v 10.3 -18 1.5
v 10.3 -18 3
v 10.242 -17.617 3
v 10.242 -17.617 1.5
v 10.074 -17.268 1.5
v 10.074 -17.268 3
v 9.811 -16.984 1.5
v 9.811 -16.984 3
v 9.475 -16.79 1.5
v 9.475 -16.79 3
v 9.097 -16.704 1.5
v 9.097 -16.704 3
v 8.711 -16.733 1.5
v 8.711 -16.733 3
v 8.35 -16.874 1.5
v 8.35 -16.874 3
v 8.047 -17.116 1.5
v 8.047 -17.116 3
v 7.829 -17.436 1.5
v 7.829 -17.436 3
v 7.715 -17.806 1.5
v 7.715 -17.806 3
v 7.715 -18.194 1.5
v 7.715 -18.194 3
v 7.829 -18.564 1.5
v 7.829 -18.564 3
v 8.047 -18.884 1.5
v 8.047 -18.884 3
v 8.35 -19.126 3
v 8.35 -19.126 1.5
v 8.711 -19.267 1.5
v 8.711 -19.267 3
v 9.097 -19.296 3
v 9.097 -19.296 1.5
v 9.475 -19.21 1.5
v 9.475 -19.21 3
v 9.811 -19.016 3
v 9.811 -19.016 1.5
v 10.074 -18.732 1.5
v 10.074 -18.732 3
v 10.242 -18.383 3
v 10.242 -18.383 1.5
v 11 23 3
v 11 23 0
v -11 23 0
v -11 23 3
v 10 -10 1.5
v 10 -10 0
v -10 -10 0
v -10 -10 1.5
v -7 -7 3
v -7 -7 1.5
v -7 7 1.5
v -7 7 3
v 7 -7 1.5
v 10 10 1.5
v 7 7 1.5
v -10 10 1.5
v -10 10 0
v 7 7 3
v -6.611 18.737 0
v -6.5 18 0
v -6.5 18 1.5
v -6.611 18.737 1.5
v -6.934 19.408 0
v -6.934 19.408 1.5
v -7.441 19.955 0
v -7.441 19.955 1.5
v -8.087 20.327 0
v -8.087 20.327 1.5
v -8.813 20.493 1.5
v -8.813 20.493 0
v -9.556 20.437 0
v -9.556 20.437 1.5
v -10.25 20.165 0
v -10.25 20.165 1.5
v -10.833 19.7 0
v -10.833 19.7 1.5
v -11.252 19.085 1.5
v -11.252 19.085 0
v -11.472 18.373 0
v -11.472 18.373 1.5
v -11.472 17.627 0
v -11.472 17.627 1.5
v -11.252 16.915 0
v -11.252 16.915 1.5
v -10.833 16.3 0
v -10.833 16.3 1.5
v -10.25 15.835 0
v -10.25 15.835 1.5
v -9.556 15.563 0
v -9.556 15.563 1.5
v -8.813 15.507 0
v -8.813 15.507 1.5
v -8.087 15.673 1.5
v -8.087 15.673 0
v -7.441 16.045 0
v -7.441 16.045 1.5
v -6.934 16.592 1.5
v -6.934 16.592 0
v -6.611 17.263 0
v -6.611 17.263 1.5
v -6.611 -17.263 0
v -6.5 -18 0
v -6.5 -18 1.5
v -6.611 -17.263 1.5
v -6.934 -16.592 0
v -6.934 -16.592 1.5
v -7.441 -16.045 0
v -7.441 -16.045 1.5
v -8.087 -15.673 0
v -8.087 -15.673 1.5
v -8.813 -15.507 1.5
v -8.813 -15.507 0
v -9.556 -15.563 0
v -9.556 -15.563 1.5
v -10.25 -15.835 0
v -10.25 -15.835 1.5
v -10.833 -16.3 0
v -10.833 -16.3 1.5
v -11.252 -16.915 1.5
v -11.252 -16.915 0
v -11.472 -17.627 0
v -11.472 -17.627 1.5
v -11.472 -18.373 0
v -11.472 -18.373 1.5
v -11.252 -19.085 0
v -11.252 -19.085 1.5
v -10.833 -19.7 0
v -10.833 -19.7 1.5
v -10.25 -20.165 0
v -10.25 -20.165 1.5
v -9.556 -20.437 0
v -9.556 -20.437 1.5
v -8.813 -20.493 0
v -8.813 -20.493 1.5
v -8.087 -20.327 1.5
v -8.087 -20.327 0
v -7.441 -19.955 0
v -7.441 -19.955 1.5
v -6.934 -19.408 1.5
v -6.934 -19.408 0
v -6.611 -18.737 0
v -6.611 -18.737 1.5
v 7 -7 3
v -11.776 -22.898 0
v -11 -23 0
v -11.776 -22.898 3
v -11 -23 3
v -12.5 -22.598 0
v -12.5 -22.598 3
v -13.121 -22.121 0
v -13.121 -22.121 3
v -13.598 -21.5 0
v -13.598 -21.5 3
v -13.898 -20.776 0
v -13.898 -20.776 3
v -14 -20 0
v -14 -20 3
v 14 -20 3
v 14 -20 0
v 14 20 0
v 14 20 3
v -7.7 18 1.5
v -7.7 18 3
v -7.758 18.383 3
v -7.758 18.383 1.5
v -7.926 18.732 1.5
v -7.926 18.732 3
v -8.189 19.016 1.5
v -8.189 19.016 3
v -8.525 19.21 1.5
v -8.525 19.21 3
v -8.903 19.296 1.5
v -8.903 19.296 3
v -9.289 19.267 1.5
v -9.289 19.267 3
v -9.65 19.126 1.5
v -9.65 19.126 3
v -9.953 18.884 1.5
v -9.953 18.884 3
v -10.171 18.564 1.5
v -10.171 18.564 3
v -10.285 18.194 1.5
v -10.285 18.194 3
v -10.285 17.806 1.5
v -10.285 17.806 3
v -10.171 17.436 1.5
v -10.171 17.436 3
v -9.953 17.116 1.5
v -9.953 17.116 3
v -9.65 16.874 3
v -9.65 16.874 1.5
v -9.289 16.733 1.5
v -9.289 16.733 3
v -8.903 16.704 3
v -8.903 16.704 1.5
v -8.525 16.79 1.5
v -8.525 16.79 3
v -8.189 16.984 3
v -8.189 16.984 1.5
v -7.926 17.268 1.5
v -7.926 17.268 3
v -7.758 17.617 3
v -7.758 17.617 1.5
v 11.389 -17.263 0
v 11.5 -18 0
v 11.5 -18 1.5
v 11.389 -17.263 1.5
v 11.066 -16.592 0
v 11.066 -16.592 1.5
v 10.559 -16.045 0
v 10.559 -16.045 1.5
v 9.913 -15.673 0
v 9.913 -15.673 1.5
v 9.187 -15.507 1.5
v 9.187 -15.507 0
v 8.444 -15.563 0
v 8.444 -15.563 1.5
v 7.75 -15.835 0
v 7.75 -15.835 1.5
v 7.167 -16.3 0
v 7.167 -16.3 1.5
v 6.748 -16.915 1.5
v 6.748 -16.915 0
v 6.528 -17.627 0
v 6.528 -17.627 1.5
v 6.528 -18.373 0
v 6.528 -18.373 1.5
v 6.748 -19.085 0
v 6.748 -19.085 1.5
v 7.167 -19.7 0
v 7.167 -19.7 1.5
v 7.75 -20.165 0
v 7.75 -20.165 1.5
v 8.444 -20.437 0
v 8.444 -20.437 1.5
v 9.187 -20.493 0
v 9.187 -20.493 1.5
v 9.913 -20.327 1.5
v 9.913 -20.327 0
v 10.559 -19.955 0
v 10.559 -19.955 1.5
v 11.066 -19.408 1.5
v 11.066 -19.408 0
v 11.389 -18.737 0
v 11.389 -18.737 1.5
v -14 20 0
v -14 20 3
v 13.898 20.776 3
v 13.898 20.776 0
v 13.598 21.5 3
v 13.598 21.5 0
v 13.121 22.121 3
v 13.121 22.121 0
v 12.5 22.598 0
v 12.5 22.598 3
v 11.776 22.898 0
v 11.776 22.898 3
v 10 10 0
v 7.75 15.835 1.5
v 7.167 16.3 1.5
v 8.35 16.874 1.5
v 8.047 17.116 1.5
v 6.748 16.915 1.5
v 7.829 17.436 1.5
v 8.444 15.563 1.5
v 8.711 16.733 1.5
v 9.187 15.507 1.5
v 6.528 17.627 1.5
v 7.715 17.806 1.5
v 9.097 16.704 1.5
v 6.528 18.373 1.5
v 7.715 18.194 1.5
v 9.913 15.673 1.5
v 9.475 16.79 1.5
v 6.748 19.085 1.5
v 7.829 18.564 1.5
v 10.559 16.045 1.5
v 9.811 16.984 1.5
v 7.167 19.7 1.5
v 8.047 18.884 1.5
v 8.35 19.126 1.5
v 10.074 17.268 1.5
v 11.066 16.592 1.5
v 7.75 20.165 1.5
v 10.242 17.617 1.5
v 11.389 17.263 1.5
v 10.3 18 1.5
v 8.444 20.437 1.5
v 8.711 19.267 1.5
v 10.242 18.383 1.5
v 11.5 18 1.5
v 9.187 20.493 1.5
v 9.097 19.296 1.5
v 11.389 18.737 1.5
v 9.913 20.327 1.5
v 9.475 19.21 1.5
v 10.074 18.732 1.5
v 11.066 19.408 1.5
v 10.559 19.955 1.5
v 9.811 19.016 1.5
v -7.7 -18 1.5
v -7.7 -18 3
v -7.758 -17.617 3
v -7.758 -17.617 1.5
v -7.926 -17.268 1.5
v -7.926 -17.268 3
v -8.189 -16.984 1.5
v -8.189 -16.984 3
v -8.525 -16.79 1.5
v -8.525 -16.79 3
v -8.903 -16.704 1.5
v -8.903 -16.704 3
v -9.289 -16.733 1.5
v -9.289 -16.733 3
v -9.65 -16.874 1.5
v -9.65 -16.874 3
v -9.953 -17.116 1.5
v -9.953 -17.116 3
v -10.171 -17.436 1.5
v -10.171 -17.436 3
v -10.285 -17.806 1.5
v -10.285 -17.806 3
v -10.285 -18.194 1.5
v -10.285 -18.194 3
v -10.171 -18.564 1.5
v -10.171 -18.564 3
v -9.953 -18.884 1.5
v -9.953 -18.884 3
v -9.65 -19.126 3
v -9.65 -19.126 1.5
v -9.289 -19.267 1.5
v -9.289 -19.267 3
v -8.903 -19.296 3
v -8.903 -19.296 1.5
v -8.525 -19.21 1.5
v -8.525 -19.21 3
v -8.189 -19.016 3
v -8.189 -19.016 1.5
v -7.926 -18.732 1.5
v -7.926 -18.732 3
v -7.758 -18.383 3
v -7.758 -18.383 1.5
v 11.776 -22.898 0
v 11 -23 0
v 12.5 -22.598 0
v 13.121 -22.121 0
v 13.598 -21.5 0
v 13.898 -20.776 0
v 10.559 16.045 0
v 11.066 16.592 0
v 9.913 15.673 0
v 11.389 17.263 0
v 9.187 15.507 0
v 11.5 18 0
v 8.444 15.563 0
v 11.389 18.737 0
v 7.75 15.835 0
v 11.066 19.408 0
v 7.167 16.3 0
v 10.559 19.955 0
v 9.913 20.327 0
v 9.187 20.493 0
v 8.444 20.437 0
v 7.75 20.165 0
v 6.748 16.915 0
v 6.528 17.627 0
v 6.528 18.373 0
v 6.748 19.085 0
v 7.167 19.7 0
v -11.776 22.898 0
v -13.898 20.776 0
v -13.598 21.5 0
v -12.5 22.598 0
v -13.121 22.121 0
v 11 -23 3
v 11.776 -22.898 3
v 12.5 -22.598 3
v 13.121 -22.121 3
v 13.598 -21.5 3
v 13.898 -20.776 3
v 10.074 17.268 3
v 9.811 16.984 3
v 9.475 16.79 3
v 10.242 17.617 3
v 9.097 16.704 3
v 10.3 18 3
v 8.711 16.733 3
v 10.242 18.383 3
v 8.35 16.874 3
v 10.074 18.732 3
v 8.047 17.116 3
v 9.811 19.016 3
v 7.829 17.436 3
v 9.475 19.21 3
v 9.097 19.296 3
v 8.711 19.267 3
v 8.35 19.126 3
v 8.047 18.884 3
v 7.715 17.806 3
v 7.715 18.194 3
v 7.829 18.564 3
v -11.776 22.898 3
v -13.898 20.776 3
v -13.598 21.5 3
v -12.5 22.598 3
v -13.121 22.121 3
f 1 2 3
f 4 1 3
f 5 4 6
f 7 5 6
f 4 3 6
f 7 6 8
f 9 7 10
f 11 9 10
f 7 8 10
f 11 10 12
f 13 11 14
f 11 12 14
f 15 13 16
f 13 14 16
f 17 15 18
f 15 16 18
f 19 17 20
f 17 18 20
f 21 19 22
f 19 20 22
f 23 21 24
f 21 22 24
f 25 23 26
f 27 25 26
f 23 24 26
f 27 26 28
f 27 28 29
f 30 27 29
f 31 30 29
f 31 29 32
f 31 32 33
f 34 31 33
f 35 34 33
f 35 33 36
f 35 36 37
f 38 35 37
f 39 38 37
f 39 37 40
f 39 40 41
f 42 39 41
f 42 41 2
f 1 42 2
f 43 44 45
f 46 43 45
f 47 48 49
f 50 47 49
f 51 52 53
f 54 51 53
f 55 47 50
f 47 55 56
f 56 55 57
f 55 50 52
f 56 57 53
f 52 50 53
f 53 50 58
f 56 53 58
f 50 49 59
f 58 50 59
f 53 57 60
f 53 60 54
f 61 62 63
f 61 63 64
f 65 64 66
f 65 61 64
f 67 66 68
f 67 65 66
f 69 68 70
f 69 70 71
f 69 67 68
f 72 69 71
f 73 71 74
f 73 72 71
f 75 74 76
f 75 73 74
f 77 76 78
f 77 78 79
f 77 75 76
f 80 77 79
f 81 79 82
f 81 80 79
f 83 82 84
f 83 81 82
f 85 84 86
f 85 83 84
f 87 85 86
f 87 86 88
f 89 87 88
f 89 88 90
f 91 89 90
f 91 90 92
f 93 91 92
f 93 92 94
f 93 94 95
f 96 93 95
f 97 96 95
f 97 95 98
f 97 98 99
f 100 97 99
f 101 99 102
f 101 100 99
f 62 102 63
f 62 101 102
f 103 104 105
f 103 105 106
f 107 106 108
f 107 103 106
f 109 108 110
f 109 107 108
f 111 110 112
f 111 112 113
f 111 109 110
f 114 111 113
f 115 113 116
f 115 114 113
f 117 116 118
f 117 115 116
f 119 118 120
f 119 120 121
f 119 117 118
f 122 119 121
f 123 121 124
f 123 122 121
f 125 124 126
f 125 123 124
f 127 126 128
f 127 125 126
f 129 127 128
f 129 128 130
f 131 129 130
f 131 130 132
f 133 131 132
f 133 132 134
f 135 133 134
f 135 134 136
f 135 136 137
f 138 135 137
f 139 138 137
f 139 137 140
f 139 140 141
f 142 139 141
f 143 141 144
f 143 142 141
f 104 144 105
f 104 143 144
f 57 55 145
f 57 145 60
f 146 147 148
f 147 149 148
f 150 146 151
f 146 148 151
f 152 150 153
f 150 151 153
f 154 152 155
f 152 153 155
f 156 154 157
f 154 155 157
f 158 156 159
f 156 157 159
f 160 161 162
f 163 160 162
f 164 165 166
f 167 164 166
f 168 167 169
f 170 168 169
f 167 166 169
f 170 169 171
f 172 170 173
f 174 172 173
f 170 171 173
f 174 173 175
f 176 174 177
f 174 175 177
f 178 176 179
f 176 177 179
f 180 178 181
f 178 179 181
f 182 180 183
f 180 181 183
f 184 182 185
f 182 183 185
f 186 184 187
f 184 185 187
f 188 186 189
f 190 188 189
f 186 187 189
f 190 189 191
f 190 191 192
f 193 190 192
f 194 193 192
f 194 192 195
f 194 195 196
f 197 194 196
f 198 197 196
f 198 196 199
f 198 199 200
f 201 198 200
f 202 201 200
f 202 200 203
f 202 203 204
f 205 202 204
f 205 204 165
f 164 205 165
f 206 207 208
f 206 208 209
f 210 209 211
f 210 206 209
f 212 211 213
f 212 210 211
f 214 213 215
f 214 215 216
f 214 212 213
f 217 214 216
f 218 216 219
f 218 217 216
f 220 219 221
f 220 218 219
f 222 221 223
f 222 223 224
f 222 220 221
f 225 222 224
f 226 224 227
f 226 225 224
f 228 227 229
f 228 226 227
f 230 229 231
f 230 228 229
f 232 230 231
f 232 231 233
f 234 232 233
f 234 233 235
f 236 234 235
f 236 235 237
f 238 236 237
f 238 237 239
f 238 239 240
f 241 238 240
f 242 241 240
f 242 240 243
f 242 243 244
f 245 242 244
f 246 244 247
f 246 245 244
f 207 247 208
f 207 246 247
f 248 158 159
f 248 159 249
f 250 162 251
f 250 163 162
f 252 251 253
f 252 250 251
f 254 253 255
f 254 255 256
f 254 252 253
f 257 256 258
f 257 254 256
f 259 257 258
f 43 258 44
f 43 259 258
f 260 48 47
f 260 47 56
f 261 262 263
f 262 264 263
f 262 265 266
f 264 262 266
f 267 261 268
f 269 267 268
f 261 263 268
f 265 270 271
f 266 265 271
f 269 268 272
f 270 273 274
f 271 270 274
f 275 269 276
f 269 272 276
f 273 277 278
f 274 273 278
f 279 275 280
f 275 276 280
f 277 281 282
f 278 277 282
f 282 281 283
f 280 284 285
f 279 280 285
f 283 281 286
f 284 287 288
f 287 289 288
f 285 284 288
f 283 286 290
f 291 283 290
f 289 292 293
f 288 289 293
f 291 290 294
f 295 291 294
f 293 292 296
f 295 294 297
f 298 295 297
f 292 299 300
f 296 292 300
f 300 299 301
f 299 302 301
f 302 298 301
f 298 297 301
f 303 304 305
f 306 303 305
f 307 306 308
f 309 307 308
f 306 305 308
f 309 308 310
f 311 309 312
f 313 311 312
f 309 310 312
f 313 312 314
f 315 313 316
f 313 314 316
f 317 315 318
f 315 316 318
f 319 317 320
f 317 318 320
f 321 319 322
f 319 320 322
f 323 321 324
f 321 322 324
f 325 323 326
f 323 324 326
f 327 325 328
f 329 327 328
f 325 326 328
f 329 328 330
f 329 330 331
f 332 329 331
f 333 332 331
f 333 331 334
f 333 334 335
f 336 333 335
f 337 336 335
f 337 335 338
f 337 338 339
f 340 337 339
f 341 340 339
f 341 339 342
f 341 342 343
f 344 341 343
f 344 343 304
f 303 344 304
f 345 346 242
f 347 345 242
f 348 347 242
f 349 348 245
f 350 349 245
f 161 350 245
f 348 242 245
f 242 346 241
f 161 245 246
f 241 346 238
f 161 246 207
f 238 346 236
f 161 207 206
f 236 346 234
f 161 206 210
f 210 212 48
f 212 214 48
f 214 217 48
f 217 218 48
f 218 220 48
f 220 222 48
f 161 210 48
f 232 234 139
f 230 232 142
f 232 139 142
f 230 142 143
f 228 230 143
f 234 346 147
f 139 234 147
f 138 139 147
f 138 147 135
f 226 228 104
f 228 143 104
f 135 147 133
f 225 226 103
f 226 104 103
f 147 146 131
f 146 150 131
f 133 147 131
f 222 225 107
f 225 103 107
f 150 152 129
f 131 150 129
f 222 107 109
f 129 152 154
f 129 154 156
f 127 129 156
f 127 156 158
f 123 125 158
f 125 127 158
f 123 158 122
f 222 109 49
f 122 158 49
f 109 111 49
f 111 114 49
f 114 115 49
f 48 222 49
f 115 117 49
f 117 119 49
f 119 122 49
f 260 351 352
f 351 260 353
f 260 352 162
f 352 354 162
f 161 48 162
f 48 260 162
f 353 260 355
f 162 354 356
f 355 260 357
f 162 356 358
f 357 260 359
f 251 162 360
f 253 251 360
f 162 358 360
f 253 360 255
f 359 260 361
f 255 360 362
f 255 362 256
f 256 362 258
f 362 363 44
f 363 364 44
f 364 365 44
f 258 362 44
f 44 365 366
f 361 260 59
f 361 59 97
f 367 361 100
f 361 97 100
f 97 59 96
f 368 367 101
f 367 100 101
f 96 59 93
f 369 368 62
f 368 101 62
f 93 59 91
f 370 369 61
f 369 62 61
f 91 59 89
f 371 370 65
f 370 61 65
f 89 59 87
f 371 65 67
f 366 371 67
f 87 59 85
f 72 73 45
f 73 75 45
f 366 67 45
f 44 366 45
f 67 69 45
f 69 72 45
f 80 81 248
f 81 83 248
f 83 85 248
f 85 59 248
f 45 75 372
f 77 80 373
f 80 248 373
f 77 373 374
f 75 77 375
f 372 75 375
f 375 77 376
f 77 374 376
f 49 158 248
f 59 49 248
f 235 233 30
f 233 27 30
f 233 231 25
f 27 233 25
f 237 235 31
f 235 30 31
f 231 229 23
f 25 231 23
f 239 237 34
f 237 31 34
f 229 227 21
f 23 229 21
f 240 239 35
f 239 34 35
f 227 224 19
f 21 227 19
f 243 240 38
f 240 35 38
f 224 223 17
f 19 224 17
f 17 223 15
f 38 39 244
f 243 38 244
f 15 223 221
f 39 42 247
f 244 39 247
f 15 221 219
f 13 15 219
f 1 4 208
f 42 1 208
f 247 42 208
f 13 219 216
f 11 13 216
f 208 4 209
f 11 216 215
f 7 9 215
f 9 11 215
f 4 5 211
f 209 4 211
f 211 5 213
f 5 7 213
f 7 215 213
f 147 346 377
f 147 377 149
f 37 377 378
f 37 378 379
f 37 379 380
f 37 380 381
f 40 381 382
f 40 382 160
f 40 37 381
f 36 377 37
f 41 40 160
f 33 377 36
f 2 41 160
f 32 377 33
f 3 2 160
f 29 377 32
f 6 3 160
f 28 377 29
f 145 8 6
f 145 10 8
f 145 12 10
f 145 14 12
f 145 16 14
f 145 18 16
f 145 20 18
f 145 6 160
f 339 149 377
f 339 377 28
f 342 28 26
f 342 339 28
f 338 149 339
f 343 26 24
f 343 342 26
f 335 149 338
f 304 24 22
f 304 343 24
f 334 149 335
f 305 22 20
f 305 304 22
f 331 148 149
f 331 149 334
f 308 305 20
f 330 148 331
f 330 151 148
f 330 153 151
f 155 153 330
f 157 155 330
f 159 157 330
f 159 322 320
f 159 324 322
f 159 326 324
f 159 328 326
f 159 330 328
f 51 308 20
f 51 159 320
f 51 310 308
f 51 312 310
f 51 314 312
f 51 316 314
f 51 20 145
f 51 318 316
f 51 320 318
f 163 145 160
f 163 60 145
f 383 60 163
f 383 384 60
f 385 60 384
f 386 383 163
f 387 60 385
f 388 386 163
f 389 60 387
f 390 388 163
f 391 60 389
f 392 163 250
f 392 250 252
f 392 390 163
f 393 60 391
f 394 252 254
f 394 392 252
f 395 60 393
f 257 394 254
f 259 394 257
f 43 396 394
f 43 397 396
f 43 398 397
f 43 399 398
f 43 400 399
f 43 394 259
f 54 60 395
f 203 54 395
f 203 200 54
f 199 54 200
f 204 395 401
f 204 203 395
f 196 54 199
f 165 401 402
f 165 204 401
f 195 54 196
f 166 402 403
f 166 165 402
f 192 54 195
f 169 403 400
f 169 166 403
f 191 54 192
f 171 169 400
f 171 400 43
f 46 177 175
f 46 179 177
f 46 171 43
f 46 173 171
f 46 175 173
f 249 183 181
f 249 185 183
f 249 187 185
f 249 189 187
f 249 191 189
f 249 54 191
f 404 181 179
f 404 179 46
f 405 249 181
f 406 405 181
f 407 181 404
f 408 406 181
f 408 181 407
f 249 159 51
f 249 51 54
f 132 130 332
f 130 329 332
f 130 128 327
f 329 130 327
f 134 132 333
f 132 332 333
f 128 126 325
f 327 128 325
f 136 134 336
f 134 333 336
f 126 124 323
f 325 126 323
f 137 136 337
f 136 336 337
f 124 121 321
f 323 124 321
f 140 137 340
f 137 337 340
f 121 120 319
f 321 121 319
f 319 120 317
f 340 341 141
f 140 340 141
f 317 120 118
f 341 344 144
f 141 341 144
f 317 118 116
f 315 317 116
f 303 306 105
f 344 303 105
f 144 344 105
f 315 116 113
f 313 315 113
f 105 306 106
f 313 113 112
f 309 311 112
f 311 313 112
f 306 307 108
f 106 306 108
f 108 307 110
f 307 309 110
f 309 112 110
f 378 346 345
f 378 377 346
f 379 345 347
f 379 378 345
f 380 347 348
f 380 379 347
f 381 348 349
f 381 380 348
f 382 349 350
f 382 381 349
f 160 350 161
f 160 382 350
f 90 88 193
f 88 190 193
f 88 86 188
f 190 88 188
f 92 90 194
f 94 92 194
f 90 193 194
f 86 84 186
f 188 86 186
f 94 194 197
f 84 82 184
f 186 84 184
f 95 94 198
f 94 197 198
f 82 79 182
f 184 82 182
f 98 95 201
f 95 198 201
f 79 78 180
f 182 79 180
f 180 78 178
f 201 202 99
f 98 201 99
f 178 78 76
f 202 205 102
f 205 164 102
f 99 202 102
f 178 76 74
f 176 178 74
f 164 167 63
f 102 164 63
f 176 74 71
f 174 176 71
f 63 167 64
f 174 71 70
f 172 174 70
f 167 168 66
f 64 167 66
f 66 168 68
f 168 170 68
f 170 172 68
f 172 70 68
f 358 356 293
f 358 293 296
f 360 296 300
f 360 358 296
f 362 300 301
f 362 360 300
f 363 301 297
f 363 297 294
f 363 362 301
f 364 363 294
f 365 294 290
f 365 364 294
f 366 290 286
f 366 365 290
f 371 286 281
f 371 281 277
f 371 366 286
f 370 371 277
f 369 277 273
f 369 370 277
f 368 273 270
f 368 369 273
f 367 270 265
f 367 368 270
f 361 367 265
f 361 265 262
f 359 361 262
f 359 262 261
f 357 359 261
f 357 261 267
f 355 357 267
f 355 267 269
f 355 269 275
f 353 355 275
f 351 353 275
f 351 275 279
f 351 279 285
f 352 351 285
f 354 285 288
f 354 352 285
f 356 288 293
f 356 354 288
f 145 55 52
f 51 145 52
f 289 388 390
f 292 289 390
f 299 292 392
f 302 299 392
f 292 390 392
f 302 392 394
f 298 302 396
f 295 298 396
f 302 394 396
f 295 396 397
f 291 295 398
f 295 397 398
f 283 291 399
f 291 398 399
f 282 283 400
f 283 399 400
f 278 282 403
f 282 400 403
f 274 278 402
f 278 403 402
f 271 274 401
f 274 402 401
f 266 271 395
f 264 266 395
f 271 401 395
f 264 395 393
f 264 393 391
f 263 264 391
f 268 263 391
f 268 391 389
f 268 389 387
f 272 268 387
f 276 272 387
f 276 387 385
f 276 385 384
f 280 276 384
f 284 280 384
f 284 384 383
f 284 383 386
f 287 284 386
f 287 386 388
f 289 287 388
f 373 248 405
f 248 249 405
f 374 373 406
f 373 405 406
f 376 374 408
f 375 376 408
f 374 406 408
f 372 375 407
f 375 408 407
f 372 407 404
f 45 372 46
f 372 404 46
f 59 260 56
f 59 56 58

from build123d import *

# Parameters (mm, degrees)
SKETCH2_W                  = 46
SKETCH2_H                  = 28
SKETCH2_W_2                = 14
SKETCH2_H_2                = 14
BOSS_EXTRUDE1_DEPTH        = 3
F_2_6_2_6_DIAMETER_HOLE1_D = 2.6
SKETCH2_6_W                = 20
SKETCH2_6_H                = 20
SKETCH2_6_R                = 2.5
CUT_EXTRUDE2_DEPTH         = 1.5
FILLET1_R                  = 3


with BuildPart() as part:
    # Sketch2 → Boss-Extrude1 (new body)
    with BuildSketch(Plane(origin=(0, 0, 0), x_dir=(0, 1, 0), z_dir=(0, 0, 1))):
        Rectangle(SKETCH2_W, SKETCH2_H)
        Rectangle(SKETCH2_W_2, SKETCH2_H_2, mode=Mode.SUBTRACT)
    extrude(amount=BOSS_EXTRUDE1_DEPTH)

    # Ø2.6 (2.6) Diameter Hole1 (through all)
    with Locations(Plane(origin=(0, 0, 0), x_dir=(-1, 0, 0), z_dir=(0, 0, -1))):
        with Locations((-9, -18), (9, -18), (-9, 18), (9, 18)):
            Hole(F_2_6_2_6_DIAMETER_HOLE1_D / 2)

    # Sketch2<6> → Cut-Extrude2 (cut)
    with BuildSketch(Plane(origin=(0, 0, 0), x_dir=(0, 1, 0), z_dir=(0, 0, 1))):
        Rectangle(SKETCH2_6_W, SKETCH2_6_H)
        with Locations((-18, 9)):
            Circle(SKETCH2_6_R)
        with Locations((18, 9)):
            Circle(SKETCH2_6_R)
        with Locations((18, -9)):
            Circle(SKETCH2_6_R)
        with Locations((-18, -9)):
            Circle(SKETCH2_6_R)
    extrude(amount=CUT_EXTRUDE2_DEPTH, mode=Mode.SUBTRACT)

    # Fillet1
    fillet1_edges = [part.edges().sort_by_distance(p)[0] for p in [
        (14, 23, 1.5),
        (14, -23, 1.5),
        (-14, -23, 1.5),
        (-14, 23, 1.5),
    ]]
    fillet(fillet1_edges, radius=FILLET1_R)


solid = part.part
